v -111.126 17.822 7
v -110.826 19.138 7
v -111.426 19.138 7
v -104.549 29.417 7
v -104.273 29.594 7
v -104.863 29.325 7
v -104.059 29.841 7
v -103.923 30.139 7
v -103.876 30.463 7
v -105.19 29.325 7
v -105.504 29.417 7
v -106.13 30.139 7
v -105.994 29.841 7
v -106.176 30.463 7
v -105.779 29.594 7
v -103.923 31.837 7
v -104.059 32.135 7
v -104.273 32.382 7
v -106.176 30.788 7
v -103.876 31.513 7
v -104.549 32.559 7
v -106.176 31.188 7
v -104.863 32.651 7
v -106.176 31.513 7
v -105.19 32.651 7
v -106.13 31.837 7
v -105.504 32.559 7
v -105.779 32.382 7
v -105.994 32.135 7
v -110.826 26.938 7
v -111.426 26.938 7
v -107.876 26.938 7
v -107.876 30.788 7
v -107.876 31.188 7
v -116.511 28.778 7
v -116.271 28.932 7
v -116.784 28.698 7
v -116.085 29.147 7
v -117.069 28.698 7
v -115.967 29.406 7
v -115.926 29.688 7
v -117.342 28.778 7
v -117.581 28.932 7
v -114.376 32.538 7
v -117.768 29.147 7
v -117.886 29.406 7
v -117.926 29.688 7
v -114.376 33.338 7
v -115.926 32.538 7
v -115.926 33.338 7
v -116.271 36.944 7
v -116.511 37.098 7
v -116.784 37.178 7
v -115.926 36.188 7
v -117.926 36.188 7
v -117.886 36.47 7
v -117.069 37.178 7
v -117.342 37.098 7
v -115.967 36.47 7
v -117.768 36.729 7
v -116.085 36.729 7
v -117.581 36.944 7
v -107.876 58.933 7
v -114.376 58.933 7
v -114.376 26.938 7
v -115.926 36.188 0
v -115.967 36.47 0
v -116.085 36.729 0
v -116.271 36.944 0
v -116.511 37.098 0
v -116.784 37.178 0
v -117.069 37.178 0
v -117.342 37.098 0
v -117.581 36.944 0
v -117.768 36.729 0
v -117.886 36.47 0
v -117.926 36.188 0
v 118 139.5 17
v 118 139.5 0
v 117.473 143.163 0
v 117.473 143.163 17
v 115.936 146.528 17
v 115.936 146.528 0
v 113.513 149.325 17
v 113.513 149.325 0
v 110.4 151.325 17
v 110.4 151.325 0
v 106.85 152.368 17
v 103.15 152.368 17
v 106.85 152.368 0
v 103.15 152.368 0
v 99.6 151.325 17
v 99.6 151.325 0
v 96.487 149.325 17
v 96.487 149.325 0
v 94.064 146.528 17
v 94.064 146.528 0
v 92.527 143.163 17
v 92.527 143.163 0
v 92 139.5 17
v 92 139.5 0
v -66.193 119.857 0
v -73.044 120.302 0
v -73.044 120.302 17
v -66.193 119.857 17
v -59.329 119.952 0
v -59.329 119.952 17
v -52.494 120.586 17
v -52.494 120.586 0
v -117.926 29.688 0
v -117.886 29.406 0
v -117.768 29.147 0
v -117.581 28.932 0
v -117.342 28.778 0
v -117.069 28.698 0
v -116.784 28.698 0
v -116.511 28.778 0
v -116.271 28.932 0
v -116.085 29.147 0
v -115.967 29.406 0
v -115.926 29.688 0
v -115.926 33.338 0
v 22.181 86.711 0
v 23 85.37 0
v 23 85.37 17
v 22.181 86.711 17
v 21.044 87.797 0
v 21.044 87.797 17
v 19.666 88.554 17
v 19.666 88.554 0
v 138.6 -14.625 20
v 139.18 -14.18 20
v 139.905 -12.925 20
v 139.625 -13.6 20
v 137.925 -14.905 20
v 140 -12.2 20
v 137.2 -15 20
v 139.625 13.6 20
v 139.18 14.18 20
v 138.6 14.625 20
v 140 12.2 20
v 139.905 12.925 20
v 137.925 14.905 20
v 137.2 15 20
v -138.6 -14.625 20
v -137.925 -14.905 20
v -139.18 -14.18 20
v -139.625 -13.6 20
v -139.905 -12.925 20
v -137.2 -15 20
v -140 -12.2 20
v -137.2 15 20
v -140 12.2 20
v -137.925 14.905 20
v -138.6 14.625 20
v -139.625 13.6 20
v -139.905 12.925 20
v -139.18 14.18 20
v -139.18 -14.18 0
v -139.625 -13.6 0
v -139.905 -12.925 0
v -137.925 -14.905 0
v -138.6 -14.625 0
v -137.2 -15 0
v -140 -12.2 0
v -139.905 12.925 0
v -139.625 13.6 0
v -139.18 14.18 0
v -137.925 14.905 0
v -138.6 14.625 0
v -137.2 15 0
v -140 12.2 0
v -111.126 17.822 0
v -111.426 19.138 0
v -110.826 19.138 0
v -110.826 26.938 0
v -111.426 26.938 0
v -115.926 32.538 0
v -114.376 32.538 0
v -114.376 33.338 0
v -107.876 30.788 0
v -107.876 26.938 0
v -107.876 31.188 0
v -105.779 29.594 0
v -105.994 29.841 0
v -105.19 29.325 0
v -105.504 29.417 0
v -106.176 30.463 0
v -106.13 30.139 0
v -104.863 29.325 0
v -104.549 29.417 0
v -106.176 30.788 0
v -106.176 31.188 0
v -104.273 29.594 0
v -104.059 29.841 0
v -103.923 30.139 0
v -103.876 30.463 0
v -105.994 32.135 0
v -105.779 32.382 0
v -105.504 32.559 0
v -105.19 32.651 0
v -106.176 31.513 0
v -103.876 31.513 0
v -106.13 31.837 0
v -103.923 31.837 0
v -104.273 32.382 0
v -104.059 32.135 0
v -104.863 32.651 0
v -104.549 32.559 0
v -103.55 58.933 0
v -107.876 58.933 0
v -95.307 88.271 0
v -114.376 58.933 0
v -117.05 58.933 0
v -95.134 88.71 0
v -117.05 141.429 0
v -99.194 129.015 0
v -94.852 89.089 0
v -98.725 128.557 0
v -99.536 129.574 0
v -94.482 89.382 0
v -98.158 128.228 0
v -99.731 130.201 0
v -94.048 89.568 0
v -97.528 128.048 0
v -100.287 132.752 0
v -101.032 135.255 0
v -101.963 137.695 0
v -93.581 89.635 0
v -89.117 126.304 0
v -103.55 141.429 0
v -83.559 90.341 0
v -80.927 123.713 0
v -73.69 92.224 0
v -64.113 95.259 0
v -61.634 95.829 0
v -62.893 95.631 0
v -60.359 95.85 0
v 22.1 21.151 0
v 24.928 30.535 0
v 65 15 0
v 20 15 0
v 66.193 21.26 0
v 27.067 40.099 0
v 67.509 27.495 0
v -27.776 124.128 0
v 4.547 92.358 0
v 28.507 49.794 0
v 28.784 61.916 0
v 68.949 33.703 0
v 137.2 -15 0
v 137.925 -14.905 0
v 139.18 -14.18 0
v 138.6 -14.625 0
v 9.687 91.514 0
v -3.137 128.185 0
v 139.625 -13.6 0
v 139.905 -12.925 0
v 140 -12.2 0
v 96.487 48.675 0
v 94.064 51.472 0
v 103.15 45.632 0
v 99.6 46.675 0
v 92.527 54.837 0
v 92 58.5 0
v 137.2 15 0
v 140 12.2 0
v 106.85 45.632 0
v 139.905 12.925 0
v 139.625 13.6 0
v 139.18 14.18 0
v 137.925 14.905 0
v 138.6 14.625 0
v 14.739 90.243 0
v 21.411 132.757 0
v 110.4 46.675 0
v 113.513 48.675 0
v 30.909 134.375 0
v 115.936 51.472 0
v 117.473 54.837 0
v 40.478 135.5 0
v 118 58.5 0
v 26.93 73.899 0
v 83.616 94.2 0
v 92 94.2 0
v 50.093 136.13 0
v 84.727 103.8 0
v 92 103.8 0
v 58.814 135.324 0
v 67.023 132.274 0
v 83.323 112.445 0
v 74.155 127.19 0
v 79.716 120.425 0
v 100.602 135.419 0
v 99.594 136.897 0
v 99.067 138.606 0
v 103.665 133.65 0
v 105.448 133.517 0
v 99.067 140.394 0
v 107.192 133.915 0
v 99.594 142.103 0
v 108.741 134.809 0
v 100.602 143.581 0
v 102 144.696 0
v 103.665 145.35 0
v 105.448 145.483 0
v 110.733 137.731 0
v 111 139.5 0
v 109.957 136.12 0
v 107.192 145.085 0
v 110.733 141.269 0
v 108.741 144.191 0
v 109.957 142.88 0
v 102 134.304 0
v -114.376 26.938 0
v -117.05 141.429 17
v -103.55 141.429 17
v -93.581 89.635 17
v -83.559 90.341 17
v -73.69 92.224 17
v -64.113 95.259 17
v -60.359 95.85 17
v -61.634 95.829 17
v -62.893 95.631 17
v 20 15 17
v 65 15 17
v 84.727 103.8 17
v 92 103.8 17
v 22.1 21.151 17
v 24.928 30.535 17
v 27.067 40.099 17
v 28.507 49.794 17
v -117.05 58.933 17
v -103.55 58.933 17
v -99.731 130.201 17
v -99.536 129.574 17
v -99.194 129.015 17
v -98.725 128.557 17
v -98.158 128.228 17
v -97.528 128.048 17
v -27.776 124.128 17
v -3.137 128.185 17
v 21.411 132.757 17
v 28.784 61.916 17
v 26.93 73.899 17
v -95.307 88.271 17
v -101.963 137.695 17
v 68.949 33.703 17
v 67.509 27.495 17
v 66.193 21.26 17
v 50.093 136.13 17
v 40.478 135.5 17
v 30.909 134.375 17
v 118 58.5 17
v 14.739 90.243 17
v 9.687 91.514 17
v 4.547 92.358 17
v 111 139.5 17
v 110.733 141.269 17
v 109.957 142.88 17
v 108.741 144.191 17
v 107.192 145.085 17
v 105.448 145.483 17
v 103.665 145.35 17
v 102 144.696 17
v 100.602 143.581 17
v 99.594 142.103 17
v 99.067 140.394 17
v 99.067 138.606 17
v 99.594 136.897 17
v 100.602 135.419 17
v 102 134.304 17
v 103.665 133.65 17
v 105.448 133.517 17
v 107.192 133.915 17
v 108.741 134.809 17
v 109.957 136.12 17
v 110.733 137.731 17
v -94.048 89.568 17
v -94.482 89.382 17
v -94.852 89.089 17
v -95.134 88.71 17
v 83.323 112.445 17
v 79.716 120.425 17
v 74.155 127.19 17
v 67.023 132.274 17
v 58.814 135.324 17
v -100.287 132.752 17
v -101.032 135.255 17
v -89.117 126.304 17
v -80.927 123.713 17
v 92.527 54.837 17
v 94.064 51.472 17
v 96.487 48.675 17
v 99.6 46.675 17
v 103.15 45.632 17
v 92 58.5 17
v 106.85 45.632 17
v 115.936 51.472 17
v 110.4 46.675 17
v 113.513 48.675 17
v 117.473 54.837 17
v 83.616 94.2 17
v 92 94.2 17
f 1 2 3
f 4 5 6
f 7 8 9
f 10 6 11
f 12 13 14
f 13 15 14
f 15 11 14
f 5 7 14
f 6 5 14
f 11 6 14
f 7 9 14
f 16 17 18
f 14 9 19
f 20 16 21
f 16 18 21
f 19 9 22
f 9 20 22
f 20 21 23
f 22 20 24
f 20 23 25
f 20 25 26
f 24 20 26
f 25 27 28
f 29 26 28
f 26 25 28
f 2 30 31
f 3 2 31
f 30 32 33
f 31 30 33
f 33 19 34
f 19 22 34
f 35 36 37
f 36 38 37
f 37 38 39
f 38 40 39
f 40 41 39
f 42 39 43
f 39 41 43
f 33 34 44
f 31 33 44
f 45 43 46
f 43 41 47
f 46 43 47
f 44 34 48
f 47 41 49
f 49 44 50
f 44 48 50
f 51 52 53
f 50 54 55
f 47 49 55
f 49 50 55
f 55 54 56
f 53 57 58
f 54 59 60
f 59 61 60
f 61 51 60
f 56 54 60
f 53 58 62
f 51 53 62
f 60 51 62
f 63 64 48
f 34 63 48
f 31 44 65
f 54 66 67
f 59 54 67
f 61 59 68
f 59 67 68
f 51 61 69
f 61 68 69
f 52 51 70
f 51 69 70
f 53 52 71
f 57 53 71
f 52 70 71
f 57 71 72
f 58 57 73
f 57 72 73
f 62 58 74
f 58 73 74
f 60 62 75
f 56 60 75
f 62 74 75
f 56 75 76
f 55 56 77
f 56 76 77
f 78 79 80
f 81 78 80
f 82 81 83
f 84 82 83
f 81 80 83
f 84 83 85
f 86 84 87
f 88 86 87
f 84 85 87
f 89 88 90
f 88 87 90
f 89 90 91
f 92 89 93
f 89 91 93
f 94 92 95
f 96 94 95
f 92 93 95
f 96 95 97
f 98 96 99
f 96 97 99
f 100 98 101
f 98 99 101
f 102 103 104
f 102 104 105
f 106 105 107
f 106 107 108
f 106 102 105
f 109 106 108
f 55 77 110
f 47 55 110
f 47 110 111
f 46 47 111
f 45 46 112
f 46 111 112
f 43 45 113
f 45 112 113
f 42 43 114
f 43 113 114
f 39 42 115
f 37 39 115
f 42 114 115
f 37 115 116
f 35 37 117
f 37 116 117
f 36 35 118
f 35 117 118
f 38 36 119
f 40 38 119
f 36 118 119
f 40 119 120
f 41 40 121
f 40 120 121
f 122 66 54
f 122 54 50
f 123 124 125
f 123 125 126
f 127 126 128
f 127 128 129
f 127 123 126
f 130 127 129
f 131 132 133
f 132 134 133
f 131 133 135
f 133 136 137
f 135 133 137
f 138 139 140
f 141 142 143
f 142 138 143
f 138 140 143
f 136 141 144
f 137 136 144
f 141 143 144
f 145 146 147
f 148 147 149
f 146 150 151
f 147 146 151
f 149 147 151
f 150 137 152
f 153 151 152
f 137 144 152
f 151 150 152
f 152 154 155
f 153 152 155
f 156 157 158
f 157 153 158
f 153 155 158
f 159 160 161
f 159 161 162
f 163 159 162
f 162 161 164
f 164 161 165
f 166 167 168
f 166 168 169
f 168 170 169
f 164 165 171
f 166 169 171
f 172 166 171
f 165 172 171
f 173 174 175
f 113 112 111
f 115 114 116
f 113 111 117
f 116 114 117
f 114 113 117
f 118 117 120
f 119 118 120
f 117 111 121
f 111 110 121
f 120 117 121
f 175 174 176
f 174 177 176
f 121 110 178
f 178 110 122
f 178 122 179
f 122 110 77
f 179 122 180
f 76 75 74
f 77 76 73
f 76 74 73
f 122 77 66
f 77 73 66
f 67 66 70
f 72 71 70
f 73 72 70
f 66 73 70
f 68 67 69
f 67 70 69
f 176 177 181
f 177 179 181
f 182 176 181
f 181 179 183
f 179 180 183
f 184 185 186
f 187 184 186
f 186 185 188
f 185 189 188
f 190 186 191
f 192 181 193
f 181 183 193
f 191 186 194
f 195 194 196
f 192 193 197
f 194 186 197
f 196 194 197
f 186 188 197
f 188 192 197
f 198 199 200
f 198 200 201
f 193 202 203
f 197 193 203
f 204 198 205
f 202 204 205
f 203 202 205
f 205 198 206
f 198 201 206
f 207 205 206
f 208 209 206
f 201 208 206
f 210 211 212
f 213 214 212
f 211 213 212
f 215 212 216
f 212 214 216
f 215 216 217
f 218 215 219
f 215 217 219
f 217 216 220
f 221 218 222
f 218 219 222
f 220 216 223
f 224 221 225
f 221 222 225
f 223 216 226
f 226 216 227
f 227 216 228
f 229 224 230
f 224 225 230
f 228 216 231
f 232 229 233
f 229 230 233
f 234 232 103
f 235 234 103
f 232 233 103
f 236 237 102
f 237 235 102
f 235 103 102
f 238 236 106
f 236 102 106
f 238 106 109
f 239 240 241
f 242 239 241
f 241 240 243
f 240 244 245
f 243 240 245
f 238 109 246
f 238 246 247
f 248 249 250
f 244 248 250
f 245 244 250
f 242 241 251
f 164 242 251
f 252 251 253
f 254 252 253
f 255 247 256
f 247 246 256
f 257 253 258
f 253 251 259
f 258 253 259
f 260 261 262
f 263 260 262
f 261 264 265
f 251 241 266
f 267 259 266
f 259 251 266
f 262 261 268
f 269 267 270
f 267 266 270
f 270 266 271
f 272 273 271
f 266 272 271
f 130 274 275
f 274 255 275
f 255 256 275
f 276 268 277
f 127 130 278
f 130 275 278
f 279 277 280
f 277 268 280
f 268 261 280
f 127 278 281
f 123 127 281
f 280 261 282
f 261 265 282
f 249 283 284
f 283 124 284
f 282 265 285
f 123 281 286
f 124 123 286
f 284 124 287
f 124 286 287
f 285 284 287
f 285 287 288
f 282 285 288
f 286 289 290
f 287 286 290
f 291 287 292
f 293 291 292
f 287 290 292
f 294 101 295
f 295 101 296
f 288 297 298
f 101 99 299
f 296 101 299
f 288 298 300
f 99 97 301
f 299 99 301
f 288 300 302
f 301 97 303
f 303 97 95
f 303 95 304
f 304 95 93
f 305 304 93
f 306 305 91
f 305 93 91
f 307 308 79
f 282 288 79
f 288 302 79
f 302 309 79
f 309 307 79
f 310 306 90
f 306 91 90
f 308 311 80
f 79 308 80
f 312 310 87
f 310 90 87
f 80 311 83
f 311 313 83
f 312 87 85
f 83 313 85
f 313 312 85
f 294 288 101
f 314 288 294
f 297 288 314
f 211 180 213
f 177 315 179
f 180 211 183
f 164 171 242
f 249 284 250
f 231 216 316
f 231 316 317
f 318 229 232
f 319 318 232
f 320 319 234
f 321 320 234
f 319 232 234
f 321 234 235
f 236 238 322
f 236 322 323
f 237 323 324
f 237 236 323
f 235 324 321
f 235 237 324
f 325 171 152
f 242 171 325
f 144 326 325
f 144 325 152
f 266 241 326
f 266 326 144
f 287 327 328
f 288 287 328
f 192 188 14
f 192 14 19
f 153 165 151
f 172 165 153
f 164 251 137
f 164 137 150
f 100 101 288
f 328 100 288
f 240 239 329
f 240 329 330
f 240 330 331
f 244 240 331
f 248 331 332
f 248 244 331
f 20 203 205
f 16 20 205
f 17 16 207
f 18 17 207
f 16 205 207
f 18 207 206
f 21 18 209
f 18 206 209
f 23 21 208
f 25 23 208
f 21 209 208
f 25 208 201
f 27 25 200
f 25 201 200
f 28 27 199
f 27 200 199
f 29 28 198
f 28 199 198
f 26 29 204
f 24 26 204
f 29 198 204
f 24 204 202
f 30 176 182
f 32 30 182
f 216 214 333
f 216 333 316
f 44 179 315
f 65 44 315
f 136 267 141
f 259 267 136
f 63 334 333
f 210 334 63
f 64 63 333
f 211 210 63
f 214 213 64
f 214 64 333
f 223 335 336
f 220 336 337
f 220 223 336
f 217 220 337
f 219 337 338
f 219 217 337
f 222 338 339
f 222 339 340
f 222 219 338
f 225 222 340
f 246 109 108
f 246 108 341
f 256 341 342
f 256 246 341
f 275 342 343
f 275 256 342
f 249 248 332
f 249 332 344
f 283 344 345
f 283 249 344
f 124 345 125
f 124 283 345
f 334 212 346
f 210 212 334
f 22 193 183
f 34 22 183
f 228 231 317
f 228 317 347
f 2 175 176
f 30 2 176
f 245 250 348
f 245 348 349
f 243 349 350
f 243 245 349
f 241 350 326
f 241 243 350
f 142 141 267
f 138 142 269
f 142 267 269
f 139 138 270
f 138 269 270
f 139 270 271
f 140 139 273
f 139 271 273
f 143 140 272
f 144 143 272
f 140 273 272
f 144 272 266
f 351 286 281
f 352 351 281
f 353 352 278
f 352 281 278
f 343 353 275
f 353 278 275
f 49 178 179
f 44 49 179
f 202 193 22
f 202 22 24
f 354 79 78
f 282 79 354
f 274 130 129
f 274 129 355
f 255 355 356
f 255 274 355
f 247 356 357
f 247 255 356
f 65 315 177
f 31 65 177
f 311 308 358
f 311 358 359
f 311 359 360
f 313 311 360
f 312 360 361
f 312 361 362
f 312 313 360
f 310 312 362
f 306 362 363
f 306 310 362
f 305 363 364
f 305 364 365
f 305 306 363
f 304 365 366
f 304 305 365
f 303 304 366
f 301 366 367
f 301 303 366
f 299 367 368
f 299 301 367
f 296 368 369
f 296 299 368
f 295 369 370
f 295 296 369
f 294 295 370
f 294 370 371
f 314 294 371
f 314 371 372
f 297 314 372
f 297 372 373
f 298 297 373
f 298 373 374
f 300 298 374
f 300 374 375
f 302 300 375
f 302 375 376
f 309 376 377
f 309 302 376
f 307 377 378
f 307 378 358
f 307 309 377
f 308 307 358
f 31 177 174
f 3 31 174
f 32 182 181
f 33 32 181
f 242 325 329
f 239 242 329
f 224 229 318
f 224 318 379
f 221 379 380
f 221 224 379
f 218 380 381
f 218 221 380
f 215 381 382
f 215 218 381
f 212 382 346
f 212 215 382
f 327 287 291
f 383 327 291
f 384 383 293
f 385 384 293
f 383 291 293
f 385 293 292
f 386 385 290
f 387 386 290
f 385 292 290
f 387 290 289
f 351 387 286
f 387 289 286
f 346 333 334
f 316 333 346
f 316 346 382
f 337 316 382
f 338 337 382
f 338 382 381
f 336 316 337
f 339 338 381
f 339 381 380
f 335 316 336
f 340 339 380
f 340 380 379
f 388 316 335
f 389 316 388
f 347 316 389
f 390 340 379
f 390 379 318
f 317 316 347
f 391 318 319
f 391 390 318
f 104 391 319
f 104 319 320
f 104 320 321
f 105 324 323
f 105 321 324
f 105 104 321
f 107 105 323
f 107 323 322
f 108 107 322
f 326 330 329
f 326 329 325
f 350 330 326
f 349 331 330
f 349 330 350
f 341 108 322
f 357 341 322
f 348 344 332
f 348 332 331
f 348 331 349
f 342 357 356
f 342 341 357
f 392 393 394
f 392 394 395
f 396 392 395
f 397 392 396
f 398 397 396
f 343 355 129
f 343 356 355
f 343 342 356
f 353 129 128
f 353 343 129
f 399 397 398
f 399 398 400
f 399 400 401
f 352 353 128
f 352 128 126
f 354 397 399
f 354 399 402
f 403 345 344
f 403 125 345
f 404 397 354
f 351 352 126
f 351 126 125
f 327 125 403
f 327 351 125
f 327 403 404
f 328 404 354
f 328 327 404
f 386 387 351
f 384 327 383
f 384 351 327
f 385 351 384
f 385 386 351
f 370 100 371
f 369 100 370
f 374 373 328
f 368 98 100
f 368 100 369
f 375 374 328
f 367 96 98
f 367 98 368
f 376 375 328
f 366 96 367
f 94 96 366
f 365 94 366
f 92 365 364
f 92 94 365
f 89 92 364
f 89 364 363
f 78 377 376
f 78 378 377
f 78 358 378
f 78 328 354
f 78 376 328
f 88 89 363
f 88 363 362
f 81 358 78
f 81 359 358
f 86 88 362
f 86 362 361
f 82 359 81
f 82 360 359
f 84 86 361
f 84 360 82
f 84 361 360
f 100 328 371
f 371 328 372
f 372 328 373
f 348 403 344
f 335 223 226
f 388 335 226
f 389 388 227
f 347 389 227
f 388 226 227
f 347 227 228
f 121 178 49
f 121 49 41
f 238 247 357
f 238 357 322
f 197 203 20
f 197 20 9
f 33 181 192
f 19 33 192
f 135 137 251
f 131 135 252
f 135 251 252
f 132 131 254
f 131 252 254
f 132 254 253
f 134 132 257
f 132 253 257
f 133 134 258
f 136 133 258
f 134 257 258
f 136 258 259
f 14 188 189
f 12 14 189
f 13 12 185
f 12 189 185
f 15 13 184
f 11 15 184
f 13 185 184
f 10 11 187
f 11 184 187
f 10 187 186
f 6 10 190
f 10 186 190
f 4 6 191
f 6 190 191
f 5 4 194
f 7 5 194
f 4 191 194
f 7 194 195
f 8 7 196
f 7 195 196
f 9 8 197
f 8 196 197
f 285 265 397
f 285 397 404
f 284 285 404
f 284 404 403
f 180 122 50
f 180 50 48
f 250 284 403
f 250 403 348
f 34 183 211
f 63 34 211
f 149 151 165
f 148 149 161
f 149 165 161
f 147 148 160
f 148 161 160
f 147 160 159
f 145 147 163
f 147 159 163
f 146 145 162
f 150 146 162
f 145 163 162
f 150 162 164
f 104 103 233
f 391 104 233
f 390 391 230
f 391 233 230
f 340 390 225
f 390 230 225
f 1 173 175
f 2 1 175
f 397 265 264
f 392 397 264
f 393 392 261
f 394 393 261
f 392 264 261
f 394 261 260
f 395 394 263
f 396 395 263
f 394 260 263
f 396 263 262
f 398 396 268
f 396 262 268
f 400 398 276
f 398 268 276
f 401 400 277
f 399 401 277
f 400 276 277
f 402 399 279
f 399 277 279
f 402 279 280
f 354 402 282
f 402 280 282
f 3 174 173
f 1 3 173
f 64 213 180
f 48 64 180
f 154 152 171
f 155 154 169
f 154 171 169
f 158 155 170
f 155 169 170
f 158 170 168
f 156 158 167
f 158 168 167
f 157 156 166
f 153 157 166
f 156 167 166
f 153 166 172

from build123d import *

# Parameters (mm, degrees)
PAD_DEPTH    = 20
PAD001_DEPTH = 17
PAD002_DEPTH = 7
SKETCH003_R  = 6
PAD003_DEPTH = 17


with BuildPart() as part:
    # Sketch → Pad (new body)
    with BuildSketch(Plane.XY):
        with BuildLine():
            Line((-137.2, 15), (137.2, 15))
            ThreePointArc((140, 12.2), (139.179899, 14.179899), (137.2, 15))
            Line((140, 12.2), (140, -12.2))
            ThreePointArc((137.2, -15), (139.179899, -14.179899), (140, -12.2))
            Line((137.2, -15), (-137.2, -15))
            ThreePointArc((-140, -12.2), (-139.179899, -14.179899), (-137.2, -15))
            Line((-140, -12.2), (-140, 12.2))
            ThreePointArc((-137.2, 15), (-139.179899, 14.179899), (-140, 12.2))
        make_face()
    extrude(amount=PAD_DEPTH)

    # Sketch001 → Pad001 (join)
    with BuildSketch(Plane.XY):
        with BuildLine():
            Line((20, 15), (22.1, 21.151423))
            ThreePointArc((22.1, 21.151423), (26.084071, 35.297898), (28.506759, 49.793628))
            ThreePointArc((28.506759, 49.793628), (28.121583, 67.94836), (23.000038, 85.369969))
            ThreePointArc((23.000038, 85.369969), (21.647561, 87.291244), (19.665958, 88.553679))
            ThreePointArc((19.665958, 88.553679), (12.226217, 90.931231), (4.547172, 92.357678))
            Line((4.547172, 92.357678), (-60.358943, 95.85))
            ThreePointArc((-60.358943, 95.85), (-62.26695, 95.75226), (-64.112729, 95.259163))
            ThreePointArc((-93.580829, 89.63501), (-78.596692, 91.136741), (-64.112729, 95.259163))
            ThreePointArc((-93.580829, 89.63501), (-94.676562, 89.247507), (-95.307077, 88.271167))
            Line((-95.307077, 88.271167), (-103.55, 58.933029))
            Line((-103.55, 58.933029), (-117.05, 58.933029))
            Line((-117.05, 58.933029), (-117.05, 141.429498))
            Line((-117.05, 141.429498), (-103.55, 141.429498))
            Line((-103.55, 141.429498), (-101.962901, 137.695318))
            ThreePointArc((-99.730837, 130.200634), (-100.635987, 134.010781), (-101.962901, 137.695318))
            ThreePointArc((-99.730837, 130.200634), (-98.973948, 128.771589), (-97.527521, 128.048472))
            ThreePointArc((-73.043885, 120.301604), (-84.988985, 125.112804), (-97.527521, 128.048472))
            ThreePointArc((-73.043885, 120.301604), (-62.760476, 119.837158), (-52.493885, 120.586391))
            ThreePointArc((-52.493885, 120.586391), (-15.446113, 126.09186), (21.410751, 132.756629))
            ThreePointArc((50.093063, 136.129962), (35.68651, 134.999351), (21.410751, 132.756629))
            ThreePointArc((83.803112, 94.973278), (77.196218, 123.945517), (50.093063, 136.129962))
            Line((83.803112, 94.973278), (68.949285, 33.703042))
            ThreePointArc((68.949285, 33.703042), (66.835565, 24.380889), (65, 15))
            Line((65, 15), (20, 15))
        make_face()
    extrude(amount=PAD001_DEPTH)

    # Sketch002 → Pad002 (join)
    with BuildSketch(Plane.XY):
        with BuildLine():
            Line((-114.376267, 58.938084), (-107.876267, 58.938084))
            Line((-107.876267, 31.188084), (-107.876267, 58.938084))
            Line((-106.176267, 31.188084), (-107.876267, 31.188084))
            Line((-106.176267, 31.188084), (-106.176267, 31.513084))
            ThreePointArc((-103.876267, 31.513084), (-105.026267, 32.663084), (-106.176267, 31.513084))
            Line((-103.876267, 31.513084), (-103.876267, 30.463084))
            ThreePointArc((-106.176267, 30.463084), (-105.026267, 29.313084), (-103.876267, 30.463084))
            Line((-106.176267, 30.463084), (-106.176267, 30.788084))
            Line((-107.876267, 30.788084), (-106.176267, 30.788084))
            Line((-107.876267, 26.938084), (-107.876267, 30.788084))
            Line((-110.826267, 26.938084), (-107.876267, 26.938084))
            Line((-110.826267, 19.138084), (-110.826267, 26.938084))
            Line((-111.126267, 17.821839), (-110.826267, 19.138084))
            Line((-111.426267, 19.138084), (-111.126267, 17.821839))
            Line((-111.426267, 26.938084), (-111.426267, 19.138084))
            Line((-114.376267, 26.938084), (-111.426267, 26.938084))
            Line((-114.376267, 32.538084), (-114.376267, 26.938084))
            Line((-115.926267, 32.538084), (-114.376267, 32.538084))
            Line((-115.926267, 32.538084), (-115.926267, 29.688084))
            ThreePointArc((-117.926267, 29.688084), (-116.926267, 28.688084), (-115.926267, 29.688084))
            Line((-117.926267, 36.188084), (-117.926267, 29.688084))
            ThreePointArc((-115.926267, 36.188084), (-116.926267, 37.188084), (-117.926267, 36.188084))
            Line((-115.926267, 36.188084), (-115.926267, 33.338084))
            Line((-115.926267, 33.338084), (-114.376267, 33.338084))
            Line((-114.376267, 58.938084), (-114.376267, 33.338084))
        make_face()
    extrude(amount=PAD002_DEPTH)

    # Sketch003 → Pad003 (join)
    with BuildSketch(Plane.XY):
        with BuildLine():
            ThreePointArc((118, 139.5), (105, 152.5), (92, 139.5))
            Line((92, 139.5), (92, 103.8))
            Line((83.55, 103.8), (92, 103.8))
            Line((83.55, 94.199976), (83.55, 103.8))
            Line((92, 94.199976), (83.55, 94.199976))
            Line((92, 58.499976), (92, 94.199976))
            ThreePointArc((92, 58.499976), (105.000012, 45.5), (118, 58.5))
            Line((118, 139.5), (118, 58.5))
        make_face()
        with Locations((105, 139.5)):
            Circle(SKETCH003_R, mode=Mode.SUBTRACT)
    extrude(amount=PAD003_DEPTH)


solid = part.part
